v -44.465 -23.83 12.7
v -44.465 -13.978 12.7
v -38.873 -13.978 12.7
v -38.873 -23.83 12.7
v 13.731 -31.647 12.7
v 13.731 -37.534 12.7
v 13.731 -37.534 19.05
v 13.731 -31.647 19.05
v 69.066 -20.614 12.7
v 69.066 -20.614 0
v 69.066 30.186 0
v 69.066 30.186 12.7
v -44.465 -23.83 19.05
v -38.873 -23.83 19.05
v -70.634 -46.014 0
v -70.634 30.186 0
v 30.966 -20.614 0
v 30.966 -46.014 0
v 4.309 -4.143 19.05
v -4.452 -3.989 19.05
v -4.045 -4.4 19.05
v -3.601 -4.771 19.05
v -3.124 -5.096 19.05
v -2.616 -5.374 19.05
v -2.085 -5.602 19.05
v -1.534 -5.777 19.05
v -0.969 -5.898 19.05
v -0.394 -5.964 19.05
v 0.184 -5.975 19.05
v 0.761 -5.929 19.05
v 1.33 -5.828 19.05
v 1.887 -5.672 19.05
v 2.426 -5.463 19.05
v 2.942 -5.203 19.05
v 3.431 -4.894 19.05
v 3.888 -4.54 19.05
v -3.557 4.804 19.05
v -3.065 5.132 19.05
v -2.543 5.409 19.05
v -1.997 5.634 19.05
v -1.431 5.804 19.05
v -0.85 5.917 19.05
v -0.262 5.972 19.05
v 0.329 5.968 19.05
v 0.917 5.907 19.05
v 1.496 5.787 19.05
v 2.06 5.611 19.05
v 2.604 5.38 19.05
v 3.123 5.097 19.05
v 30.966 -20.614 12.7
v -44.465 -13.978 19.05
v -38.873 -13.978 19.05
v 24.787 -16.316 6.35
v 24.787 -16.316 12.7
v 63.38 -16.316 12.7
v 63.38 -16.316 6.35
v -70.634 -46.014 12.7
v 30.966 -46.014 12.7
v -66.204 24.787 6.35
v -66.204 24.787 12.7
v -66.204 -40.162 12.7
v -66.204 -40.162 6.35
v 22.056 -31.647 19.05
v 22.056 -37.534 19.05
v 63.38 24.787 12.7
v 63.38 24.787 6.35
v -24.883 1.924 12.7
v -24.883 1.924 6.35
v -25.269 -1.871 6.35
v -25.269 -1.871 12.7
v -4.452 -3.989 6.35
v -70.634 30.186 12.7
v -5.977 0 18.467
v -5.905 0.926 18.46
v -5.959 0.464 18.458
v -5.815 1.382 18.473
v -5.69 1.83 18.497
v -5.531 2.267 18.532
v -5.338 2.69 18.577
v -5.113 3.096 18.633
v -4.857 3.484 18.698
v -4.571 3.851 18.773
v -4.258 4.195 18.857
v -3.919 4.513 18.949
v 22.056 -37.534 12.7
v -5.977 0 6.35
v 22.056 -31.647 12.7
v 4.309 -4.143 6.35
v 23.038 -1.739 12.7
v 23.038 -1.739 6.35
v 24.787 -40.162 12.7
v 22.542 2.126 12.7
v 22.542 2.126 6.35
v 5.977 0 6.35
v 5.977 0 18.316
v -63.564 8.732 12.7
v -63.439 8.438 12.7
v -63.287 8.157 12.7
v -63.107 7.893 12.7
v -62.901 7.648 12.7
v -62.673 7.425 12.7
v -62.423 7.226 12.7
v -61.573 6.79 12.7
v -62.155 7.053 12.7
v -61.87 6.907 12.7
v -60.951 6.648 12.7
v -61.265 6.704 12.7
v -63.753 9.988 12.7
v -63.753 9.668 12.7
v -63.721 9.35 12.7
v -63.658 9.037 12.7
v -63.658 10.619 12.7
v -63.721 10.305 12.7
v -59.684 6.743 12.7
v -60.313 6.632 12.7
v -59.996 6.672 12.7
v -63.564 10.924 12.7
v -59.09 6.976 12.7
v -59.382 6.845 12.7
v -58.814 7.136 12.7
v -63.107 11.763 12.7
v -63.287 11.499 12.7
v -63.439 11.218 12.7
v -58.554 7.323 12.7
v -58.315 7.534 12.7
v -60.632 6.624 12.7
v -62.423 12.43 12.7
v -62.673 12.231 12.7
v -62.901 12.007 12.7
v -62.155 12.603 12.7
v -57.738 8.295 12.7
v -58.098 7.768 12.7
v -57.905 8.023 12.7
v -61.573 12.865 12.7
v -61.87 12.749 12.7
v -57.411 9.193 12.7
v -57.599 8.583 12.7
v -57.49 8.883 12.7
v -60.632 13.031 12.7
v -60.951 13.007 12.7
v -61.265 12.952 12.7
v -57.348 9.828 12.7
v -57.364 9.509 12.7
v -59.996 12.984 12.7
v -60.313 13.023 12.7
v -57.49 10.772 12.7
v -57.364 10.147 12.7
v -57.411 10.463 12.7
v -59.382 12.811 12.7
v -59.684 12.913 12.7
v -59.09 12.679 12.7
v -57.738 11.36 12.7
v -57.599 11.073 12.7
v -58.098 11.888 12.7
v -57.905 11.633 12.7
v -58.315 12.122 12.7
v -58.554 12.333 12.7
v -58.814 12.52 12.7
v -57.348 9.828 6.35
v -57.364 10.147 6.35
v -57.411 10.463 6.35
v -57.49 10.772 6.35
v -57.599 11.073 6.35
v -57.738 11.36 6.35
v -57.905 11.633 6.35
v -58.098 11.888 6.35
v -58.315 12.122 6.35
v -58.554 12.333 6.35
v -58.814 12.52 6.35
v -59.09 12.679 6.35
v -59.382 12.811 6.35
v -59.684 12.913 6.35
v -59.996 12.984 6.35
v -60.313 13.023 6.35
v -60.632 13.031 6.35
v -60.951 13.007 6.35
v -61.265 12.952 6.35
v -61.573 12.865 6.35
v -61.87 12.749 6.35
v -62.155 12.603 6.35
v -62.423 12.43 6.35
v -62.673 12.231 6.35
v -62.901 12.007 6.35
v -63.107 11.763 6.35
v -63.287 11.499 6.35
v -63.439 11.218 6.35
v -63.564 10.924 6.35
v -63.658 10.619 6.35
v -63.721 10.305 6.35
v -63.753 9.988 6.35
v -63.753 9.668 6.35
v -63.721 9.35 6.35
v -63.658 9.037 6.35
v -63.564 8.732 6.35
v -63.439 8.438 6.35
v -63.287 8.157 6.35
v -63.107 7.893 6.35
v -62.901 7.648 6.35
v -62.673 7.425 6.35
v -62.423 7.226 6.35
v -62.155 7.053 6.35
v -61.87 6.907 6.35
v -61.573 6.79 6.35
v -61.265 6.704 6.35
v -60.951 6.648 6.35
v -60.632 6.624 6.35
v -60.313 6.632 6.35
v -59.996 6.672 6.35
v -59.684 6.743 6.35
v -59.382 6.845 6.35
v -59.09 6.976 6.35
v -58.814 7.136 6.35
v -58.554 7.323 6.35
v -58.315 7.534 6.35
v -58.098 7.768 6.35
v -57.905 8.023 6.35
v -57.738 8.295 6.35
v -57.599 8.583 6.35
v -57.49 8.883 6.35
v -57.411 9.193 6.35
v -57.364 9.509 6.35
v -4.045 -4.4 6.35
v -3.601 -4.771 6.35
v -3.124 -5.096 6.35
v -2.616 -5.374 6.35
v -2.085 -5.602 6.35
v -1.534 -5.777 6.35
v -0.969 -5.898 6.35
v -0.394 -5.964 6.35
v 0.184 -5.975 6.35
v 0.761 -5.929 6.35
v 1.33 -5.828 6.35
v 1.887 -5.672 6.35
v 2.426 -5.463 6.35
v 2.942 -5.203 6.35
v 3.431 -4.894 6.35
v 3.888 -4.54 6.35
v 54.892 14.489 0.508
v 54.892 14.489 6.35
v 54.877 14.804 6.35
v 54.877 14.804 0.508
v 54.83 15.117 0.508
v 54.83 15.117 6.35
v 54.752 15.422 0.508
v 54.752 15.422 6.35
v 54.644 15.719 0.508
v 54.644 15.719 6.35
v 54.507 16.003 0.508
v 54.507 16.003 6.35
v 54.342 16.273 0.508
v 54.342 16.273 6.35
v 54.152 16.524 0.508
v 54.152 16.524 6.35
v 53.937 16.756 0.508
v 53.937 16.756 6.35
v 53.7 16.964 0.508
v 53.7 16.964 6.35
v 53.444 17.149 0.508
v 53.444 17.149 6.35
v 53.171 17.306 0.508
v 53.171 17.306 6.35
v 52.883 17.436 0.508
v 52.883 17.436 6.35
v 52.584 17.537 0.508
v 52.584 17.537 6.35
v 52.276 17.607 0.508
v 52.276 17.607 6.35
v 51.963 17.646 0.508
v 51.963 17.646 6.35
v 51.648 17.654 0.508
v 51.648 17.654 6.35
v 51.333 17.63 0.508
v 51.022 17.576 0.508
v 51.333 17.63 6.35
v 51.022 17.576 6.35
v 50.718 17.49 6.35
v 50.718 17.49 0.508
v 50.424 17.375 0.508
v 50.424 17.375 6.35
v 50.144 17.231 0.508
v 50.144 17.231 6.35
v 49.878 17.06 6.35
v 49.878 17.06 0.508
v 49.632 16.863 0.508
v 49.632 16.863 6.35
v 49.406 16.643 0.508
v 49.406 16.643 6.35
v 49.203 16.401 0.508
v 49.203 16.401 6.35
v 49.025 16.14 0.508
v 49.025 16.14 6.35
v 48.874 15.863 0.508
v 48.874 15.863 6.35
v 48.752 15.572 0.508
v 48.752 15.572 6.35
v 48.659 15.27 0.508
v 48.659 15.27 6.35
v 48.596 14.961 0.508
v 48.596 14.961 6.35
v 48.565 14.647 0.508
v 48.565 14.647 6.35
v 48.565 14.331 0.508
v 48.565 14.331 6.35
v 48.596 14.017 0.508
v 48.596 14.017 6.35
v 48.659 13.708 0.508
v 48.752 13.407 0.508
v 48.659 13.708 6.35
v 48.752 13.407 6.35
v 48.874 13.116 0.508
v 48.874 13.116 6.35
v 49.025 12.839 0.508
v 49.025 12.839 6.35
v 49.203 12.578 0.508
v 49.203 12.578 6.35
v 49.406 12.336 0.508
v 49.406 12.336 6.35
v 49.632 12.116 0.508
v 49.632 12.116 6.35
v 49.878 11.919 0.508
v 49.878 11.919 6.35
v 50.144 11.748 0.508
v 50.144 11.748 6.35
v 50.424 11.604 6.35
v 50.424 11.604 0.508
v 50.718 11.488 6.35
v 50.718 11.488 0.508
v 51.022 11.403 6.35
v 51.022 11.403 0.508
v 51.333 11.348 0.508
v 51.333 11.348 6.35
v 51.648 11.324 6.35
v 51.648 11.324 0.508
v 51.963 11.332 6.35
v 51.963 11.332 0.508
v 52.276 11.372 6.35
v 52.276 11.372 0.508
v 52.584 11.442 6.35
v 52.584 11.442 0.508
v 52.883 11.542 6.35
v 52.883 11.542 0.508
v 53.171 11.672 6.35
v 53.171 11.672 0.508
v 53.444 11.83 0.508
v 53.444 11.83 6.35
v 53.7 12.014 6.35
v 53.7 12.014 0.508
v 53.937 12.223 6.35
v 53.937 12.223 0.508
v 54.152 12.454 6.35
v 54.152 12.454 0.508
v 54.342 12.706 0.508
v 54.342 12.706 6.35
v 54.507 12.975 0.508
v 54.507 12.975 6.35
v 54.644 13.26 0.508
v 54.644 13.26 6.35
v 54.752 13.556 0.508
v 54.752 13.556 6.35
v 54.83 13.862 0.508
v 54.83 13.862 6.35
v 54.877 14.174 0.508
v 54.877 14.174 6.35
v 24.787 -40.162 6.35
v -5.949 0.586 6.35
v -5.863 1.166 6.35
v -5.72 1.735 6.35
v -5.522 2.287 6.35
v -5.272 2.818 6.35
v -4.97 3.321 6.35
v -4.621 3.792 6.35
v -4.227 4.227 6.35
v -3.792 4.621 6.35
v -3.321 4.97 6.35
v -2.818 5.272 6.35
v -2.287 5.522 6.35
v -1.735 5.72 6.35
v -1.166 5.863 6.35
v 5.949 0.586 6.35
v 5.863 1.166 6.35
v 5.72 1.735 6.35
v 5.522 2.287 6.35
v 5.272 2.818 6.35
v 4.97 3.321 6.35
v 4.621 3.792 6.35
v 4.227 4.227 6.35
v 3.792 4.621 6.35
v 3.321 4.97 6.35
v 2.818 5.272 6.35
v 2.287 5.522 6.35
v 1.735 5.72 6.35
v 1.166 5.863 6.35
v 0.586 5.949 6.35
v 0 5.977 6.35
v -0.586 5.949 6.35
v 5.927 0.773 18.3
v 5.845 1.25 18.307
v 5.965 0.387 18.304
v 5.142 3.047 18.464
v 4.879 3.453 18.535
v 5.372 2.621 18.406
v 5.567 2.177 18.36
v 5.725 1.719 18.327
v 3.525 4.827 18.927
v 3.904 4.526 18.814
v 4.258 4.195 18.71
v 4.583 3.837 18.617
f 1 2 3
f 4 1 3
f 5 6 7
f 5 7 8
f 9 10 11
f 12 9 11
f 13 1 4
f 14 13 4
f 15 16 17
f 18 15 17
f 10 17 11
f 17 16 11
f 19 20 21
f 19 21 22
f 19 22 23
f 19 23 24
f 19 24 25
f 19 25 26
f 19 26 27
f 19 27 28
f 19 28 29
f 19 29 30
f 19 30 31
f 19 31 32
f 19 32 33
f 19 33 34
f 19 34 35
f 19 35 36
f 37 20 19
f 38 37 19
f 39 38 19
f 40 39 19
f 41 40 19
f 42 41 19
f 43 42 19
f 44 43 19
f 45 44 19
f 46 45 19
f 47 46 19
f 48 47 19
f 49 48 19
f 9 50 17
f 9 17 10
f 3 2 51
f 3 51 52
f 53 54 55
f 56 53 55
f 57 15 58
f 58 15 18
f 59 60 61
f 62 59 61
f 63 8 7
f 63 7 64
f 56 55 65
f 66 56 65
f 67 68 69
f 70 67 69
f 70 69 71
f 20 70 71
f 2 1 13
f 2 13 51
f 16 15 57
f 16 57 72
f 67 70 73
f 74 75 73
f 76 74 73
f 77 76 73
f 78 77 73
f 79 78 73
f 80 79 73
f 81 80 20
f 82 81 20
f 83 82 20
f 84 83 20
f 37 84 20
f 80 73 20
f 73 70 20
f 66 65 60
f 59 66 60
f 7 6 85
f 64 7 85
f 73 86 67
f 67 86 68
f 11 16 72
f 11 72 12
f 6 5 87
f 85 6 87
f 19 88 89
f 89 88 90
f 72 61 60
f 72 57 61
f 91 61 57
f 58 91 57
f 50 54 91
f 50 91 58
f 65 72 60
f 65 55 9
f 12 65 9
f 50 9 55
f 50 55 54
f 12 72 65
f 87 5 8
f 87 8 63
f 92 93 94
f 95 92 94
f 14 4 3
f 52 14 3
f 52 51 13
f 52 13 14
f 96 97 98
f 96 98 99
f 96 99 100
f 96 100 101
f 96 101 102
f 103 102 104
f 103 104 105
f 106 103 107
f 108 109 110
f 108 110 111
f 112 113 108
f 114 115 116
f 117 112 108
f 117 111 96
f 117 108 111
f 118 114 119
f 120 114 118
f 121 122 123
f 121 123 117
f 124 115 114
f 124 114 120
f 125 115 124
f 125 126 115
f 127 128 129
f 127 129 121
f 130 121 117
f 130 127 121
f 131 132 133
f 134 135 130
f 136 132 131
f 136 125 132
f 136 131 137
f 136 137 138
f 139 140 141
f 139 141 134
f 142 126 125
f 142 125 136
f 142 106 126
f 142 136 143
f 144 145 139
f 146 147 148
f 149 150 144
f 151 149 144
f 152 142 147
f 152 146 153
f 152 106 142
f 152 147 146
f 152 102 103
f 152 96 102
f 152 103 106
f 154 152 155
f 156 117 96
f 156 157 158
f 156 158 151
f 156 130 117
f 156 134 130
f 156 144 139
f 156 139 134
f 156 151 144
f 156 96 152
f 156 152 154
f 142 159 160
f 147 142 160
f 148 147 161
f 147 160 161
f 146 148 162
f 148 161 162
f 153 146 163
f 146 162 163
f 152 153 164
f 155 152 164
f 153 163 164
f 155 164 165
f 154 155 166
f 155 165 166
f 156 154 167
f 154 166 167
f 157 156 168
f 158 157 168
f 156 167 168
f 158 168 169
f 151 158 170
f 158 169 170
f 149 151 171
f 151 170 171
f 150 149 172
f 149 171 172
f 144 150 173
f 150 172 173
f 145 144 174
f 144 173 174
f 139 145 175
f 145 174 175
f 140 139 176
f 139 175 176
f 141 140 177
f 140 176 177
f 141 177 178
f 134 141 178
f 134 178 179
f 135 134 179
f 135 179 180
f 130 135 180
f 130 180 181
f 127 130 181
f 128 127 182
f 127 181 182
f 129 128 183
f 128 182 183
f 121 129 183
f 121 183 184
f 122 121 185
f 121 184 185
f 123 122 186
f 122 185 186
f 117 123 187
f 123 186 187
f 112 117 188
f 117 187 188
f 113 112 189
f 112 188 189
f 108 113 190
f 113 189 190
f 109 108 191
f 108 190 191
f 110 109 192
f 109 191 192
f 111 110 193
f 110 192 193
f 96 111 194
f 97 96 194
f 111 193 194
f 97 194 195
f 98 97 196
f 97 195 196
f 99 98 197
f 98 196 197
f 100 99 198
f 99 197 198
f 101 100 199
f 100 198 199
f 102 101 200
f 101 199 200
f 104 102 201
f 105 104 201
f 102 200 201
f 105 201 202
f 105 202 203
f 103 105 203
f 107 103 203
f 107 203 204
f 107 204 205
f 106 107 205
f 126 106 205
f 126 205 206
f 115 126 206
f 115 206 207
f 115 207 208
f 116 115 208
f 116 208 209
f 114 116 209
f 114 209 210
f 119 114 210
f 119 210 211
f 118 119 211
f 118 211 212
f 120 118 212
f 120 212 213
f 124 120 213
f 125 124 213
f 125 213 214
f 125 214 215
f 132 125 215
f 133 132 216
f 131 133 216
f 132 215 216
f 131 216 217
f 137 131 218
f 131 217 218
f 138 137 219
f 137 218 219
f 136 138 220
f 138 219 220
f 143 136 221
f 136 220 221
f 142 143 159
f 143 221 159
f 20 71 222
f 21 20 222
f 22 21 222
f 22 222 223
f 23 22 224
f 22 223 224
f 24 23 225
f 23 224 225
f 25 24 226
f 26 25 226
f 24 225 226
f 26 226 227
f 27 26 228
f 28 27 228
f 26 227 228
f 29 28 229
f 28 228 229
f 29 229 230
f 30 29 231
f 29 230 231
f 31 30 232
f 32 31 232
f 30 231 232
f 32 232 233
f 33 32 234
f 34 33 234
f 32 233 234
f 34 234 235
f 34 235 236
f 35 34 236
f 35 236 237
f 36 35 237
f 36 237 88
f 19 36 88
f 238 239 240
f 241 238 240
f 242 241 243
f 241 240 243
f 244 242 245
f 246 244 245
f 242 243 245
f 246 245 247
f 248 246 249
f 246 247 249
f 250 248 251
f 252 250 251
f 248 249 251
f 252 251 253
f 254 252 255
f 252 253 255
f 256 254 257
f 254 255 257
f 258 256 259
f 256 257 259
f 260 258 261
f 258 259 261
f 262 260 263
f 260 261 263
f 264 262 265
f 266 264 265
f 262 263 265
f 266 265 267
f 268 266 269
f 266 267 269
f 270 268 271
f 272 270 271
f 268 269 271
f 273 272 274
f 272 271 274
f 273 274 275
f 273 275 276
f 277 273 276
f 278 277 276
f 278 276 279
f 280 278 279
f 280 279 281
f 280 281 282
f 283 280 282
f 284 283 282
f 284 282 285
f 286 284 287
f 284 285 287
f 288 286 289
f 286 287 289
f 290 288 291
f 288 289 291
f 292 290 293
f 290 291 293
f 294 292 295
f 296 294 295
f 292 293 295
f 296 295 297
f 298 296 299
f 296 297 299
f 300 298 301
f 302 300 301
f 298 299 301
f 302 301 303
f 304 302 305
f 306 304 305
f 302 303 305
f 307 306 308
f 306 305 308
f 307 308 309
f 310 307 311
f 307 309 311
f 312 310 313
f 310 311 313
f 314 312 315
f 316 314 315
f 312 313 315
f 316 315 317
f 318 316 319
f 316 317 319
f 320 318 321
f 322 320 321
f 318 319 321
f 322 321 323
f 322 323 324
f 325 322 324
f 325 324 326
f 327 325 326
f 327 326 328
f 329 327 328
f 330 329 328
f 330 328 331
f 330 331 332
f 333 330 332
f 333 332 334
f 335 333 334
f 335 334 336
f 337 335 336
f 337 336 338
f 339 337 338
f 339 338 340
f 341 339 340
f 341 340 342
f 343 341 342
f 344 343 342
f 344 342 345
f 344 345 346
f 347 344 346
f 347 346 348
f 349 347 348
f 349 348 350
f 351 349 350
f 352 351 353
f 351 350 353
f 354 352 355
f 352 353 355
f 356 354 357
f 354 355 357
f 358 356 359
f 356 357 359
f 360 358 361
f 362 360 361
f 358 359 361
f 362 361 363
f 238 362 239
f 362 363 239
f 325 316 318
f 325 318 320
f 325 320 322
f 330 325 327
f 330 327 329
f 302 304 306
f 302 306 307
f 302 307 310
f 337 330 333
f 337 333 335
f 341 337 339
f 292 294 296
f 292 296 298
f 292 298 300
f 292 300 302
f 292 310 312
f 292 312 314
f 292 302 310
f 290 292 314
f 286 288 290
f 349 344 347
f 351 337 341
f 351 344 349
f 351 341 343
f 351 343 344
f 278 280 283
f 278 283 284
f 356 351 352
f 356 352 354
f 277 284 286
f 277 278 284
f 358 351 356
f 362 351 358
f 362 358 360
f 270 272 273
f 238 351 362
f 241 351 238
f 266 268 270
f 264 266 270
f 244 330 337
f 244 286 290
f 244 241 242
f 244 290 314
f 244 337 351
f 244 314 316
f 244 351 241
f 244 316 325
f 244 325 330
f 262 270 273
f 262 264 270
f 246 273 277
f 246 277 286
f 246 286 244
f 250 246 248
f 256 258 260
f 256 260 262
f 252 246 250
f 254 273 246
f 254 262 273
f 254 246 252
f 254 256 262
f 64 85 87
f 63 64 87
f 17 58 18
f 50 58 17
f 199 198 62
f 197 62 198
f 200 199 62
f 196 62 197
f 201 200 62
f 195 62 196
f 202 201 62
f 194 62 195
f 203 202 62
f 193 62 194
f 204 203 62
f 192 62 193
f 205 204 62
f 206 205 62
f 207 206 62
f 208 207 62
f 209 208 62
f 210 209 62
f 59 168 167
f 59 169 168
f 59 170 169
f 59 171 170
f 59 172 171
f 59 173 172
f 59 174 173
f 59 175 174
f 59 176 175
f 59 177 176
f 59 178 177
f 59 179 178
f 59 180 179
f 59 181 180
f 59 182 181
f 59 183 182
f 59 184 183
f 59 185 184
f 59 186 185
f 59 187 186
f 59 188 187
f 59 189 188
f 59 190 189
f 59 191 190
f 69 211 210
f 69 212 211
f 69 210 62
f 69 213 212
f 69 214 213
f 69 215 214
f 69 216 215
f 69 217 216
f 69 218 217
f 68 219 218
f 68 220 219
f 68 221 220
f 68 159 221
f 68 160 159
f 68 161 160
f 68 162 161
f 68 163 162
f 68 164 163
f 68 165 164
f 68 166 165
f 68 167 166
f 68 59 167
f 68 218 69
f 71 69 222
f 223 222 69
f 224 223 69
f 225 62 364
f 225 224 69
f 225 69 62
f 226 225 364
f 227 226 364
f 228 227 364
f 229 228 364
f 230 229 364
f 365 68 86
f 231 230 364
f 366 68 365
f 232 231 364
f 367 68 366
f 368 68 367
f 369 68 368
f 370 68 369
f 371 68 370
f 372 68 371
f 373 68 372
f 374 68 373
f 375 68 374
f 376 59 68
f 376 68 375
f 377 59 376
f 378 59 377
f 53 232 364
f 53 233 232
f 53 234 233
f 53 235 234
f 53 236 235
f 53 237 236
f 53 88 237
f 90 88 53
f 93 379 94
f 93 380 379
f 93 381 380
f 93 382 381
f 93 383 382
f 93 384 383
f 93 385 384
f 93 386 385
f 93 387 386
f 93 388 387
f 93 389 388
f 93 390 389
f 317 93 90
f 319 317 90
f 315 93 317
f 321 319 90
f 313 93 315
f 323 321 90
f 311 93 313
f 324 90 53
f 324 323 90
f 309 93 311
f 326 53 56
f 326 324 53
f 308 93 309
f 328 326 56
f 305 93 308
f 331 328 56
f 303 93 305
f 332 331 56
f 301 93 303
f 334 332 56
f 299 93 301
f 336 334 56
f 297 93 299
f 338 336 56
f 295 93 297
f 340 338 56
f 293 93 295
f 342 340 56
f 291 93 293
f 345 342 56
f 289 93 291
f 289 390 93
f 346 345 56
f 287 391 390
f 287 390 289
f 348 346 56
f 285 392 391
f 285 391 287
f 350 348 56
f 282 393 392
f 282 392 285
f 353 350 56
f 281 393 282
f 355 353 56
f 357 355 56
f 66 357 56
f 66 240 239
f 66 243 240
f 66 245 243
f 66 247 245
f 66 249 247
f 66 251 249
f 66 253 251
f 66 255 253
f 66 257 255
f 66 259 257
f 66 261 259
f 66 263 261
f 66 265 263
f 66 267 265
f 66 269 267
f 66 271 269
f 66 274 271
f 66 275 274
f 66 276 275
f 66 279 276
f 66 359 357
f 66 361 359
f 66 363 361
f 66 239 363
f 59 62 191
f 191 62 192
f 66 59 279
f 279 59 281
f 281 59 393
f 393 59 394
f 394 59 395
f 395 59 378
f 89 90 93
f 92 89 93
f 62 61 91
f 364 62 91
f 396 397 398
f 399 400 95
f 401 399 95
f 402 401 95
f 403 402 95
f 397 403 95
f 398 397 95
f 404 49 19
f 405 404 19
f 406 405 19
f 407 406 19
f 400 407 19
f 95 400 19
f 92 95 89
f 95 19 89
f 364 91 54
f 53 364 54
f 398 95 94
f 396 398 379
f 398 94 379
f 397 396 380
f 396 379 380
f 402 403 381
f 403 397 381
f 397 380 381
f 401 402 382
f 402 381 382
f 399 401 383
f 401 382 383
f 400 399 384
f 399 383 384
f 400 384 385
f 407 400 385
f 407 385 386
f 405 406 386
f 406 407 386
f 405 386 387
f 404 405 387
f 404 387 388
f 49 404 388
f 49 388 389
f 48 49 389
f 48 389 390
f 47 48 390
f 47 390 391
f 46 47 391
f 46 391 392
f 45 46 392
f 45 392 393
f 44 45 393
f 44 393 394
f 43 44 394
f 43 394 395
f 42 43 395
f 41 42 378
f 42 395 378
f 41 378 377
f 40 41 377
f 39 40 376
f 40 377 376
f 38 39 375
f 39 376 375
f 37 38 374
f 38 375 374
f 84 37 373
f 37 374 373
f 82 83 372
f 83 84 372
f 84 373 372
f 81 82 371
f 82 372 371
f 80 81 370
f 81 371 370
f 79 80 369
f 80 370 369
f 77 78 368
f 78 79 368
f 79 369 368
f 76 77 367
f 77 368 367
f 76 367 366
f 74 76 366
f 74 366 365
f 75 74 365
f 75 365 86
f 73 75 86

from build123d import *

# Parameters (mm, degrees)
F0_W      = 139.7
F0_H      = 76.2
F1_DEPTH  = 12.7
F2_W      = 38.1
F2_H      = 25.4
F3_DEPTH  = 25.4
F5_DEPTH  = 6.35
F6_R      = 5.9773594724
F7_DEPTH  = 12.7
F9_DEPTH  = 12.7
F10_R     = 3.1657943016
F11_DEPTH = 5.842
F12_R     = 3.2044828245
F13_DEPTH = 6.35
F15_DEPTH = 25.4
F17_DEPTH = 25.4
F18_W     = 8.3255954087
F18_H     = 5.8870837092
F19_DEPTH = 6.35
F20_W     = 5.5913813412
F20_H     = 9.8514808342
F21_DEPTH = 6.35


with BuildPart() as f1:
    # F0 (on Top) → F1 (new body)
    with BuildSketch(Plane.XY):
        with Locations((-0.7844120264, -7.9140792828)):
            Rectangle(F0_W, F0_H)
    extrude(amount=F1_DEPTH)

    # F2 (on face) → F3 (cut)
    with BuildSketch(Plane.XY.offset(12.7)):
        with Locations((50.0155879736, -33.3140792828)):
            Rectangle(F2_W, F2_H)
    extrude(amount=-F3_DEPTH, mode=Mode.SUBTRACT)

    # F4 (on face) → F5 (cut)
    with BuildSketch(Plane.XY.offset(12.7)):
        Polygon((-66.204354167, 24.7874129564), (-66.204354167, 22.5910600275), (-66.204354167, -40.1618853211), (24.787414819, -40.1618853211), (24.787414819, -18.8258830458), (24.787414819, -16.3157656789), (63.380472362, -16.3157656789), (63.380472362, 24.7874129564), align=None)
    extrude(amount=-F5_DEPTH, mode=Mode.SUBTRACT)

    # F6 (on face) → F7 (join)
    with BuildSketch(Plane.XY.offset(6.35)):
        Circle(F6_R)
    extrude(amount=F7_DEPTH)

    # F8 (on face) → F9 (join)
    with BuildSketch(Plane.XY.offset(6.35)):
        Polygon((-4.4516748307, -3.9889118144), (-5.9773594724, 0), (-24.8825047165, 1.9237768138), (-25.2686174839, -1.870591585), align=None)
        Polygon((22.542109713, 2.1264462266), (5.9773594724, 0), (4.3086566287, -4.142982539), (23.0382761422, -1.7386282226), align=None)
    extrude(amount=F9_DEPTH)

    # F10 (on face) → F11 (cut)
    with BuildSketch(Plane.XY.offset(6.35)):
        with Locations((51.7264902592, 14.4892735407)):
            Circle(F10_R)
    extrude(amount=-F11_DEPTH, mode=Mode.SUBTRACT)

    # F12 (on face) → F13 (join)
    with BuildSketch(Plane.XY.offset(6.35)):
        with Locations((-60.5522990227, 9.8278792575)):
            Circle(F12_R)
    extrude(amount=F13_DEPTH)

    # F14 (on face) → F15 (cut)
    with BuildSketch(Plane(origin=(-0.4473738579, -4.396387201, 0), x_dir=(0.9948623749, -0.1012366287, 0), z_dir=(-0.1012366287, -0.9948623749, 0))):
        Polygon((-24.9494244149, 12.7), (-4.0249798101, 19.05), (-6.8041724153, 19.05), (-24.9494244149, 19.05), align=None)
    extrude(amount=-F15_DEPTH, mode=Mode.SUBTRACT)

    # F16 (on face) → F17 (cut)
    with BuildSketch(Plane(origin=(0.5930722484, -4.6199586642, 0), x_dir=(0.9918608042, 0.1273269222, 0), z_dir=(0.1273269222, -0.9918608042, 0))):
        Polygon((22.6293889213, 19.05), (3.7460744135, 19.05), (22.6293889213, 12.7), align=None)
    extrude(amount=-F17_DEPTH, mode=Mode.SUBTRACT)


with BuildPart() as f19:
    # F18 (on face) → F19 (new body)
    with BuildSketch(Plane.XY.offset(12.7)):
        with Locations((17.8935732692, -34.5909558237)):
            Rectangle(F18_W, F18_H)
    extrude(amount=F19_DEPTH)


with BuildPart() as f21:
    # F20 (on face) → F21 (new body)
    with BuildSketch(Plane.XY.offset(12.7)):
        with Locations((-41.6691023856, -18.9041928388)):
            Rectangle(F20_W, F20_H)
    extrude(amount=F21_DEPTH)


solid = Compound([f1.part, f19.part, f21.part])
